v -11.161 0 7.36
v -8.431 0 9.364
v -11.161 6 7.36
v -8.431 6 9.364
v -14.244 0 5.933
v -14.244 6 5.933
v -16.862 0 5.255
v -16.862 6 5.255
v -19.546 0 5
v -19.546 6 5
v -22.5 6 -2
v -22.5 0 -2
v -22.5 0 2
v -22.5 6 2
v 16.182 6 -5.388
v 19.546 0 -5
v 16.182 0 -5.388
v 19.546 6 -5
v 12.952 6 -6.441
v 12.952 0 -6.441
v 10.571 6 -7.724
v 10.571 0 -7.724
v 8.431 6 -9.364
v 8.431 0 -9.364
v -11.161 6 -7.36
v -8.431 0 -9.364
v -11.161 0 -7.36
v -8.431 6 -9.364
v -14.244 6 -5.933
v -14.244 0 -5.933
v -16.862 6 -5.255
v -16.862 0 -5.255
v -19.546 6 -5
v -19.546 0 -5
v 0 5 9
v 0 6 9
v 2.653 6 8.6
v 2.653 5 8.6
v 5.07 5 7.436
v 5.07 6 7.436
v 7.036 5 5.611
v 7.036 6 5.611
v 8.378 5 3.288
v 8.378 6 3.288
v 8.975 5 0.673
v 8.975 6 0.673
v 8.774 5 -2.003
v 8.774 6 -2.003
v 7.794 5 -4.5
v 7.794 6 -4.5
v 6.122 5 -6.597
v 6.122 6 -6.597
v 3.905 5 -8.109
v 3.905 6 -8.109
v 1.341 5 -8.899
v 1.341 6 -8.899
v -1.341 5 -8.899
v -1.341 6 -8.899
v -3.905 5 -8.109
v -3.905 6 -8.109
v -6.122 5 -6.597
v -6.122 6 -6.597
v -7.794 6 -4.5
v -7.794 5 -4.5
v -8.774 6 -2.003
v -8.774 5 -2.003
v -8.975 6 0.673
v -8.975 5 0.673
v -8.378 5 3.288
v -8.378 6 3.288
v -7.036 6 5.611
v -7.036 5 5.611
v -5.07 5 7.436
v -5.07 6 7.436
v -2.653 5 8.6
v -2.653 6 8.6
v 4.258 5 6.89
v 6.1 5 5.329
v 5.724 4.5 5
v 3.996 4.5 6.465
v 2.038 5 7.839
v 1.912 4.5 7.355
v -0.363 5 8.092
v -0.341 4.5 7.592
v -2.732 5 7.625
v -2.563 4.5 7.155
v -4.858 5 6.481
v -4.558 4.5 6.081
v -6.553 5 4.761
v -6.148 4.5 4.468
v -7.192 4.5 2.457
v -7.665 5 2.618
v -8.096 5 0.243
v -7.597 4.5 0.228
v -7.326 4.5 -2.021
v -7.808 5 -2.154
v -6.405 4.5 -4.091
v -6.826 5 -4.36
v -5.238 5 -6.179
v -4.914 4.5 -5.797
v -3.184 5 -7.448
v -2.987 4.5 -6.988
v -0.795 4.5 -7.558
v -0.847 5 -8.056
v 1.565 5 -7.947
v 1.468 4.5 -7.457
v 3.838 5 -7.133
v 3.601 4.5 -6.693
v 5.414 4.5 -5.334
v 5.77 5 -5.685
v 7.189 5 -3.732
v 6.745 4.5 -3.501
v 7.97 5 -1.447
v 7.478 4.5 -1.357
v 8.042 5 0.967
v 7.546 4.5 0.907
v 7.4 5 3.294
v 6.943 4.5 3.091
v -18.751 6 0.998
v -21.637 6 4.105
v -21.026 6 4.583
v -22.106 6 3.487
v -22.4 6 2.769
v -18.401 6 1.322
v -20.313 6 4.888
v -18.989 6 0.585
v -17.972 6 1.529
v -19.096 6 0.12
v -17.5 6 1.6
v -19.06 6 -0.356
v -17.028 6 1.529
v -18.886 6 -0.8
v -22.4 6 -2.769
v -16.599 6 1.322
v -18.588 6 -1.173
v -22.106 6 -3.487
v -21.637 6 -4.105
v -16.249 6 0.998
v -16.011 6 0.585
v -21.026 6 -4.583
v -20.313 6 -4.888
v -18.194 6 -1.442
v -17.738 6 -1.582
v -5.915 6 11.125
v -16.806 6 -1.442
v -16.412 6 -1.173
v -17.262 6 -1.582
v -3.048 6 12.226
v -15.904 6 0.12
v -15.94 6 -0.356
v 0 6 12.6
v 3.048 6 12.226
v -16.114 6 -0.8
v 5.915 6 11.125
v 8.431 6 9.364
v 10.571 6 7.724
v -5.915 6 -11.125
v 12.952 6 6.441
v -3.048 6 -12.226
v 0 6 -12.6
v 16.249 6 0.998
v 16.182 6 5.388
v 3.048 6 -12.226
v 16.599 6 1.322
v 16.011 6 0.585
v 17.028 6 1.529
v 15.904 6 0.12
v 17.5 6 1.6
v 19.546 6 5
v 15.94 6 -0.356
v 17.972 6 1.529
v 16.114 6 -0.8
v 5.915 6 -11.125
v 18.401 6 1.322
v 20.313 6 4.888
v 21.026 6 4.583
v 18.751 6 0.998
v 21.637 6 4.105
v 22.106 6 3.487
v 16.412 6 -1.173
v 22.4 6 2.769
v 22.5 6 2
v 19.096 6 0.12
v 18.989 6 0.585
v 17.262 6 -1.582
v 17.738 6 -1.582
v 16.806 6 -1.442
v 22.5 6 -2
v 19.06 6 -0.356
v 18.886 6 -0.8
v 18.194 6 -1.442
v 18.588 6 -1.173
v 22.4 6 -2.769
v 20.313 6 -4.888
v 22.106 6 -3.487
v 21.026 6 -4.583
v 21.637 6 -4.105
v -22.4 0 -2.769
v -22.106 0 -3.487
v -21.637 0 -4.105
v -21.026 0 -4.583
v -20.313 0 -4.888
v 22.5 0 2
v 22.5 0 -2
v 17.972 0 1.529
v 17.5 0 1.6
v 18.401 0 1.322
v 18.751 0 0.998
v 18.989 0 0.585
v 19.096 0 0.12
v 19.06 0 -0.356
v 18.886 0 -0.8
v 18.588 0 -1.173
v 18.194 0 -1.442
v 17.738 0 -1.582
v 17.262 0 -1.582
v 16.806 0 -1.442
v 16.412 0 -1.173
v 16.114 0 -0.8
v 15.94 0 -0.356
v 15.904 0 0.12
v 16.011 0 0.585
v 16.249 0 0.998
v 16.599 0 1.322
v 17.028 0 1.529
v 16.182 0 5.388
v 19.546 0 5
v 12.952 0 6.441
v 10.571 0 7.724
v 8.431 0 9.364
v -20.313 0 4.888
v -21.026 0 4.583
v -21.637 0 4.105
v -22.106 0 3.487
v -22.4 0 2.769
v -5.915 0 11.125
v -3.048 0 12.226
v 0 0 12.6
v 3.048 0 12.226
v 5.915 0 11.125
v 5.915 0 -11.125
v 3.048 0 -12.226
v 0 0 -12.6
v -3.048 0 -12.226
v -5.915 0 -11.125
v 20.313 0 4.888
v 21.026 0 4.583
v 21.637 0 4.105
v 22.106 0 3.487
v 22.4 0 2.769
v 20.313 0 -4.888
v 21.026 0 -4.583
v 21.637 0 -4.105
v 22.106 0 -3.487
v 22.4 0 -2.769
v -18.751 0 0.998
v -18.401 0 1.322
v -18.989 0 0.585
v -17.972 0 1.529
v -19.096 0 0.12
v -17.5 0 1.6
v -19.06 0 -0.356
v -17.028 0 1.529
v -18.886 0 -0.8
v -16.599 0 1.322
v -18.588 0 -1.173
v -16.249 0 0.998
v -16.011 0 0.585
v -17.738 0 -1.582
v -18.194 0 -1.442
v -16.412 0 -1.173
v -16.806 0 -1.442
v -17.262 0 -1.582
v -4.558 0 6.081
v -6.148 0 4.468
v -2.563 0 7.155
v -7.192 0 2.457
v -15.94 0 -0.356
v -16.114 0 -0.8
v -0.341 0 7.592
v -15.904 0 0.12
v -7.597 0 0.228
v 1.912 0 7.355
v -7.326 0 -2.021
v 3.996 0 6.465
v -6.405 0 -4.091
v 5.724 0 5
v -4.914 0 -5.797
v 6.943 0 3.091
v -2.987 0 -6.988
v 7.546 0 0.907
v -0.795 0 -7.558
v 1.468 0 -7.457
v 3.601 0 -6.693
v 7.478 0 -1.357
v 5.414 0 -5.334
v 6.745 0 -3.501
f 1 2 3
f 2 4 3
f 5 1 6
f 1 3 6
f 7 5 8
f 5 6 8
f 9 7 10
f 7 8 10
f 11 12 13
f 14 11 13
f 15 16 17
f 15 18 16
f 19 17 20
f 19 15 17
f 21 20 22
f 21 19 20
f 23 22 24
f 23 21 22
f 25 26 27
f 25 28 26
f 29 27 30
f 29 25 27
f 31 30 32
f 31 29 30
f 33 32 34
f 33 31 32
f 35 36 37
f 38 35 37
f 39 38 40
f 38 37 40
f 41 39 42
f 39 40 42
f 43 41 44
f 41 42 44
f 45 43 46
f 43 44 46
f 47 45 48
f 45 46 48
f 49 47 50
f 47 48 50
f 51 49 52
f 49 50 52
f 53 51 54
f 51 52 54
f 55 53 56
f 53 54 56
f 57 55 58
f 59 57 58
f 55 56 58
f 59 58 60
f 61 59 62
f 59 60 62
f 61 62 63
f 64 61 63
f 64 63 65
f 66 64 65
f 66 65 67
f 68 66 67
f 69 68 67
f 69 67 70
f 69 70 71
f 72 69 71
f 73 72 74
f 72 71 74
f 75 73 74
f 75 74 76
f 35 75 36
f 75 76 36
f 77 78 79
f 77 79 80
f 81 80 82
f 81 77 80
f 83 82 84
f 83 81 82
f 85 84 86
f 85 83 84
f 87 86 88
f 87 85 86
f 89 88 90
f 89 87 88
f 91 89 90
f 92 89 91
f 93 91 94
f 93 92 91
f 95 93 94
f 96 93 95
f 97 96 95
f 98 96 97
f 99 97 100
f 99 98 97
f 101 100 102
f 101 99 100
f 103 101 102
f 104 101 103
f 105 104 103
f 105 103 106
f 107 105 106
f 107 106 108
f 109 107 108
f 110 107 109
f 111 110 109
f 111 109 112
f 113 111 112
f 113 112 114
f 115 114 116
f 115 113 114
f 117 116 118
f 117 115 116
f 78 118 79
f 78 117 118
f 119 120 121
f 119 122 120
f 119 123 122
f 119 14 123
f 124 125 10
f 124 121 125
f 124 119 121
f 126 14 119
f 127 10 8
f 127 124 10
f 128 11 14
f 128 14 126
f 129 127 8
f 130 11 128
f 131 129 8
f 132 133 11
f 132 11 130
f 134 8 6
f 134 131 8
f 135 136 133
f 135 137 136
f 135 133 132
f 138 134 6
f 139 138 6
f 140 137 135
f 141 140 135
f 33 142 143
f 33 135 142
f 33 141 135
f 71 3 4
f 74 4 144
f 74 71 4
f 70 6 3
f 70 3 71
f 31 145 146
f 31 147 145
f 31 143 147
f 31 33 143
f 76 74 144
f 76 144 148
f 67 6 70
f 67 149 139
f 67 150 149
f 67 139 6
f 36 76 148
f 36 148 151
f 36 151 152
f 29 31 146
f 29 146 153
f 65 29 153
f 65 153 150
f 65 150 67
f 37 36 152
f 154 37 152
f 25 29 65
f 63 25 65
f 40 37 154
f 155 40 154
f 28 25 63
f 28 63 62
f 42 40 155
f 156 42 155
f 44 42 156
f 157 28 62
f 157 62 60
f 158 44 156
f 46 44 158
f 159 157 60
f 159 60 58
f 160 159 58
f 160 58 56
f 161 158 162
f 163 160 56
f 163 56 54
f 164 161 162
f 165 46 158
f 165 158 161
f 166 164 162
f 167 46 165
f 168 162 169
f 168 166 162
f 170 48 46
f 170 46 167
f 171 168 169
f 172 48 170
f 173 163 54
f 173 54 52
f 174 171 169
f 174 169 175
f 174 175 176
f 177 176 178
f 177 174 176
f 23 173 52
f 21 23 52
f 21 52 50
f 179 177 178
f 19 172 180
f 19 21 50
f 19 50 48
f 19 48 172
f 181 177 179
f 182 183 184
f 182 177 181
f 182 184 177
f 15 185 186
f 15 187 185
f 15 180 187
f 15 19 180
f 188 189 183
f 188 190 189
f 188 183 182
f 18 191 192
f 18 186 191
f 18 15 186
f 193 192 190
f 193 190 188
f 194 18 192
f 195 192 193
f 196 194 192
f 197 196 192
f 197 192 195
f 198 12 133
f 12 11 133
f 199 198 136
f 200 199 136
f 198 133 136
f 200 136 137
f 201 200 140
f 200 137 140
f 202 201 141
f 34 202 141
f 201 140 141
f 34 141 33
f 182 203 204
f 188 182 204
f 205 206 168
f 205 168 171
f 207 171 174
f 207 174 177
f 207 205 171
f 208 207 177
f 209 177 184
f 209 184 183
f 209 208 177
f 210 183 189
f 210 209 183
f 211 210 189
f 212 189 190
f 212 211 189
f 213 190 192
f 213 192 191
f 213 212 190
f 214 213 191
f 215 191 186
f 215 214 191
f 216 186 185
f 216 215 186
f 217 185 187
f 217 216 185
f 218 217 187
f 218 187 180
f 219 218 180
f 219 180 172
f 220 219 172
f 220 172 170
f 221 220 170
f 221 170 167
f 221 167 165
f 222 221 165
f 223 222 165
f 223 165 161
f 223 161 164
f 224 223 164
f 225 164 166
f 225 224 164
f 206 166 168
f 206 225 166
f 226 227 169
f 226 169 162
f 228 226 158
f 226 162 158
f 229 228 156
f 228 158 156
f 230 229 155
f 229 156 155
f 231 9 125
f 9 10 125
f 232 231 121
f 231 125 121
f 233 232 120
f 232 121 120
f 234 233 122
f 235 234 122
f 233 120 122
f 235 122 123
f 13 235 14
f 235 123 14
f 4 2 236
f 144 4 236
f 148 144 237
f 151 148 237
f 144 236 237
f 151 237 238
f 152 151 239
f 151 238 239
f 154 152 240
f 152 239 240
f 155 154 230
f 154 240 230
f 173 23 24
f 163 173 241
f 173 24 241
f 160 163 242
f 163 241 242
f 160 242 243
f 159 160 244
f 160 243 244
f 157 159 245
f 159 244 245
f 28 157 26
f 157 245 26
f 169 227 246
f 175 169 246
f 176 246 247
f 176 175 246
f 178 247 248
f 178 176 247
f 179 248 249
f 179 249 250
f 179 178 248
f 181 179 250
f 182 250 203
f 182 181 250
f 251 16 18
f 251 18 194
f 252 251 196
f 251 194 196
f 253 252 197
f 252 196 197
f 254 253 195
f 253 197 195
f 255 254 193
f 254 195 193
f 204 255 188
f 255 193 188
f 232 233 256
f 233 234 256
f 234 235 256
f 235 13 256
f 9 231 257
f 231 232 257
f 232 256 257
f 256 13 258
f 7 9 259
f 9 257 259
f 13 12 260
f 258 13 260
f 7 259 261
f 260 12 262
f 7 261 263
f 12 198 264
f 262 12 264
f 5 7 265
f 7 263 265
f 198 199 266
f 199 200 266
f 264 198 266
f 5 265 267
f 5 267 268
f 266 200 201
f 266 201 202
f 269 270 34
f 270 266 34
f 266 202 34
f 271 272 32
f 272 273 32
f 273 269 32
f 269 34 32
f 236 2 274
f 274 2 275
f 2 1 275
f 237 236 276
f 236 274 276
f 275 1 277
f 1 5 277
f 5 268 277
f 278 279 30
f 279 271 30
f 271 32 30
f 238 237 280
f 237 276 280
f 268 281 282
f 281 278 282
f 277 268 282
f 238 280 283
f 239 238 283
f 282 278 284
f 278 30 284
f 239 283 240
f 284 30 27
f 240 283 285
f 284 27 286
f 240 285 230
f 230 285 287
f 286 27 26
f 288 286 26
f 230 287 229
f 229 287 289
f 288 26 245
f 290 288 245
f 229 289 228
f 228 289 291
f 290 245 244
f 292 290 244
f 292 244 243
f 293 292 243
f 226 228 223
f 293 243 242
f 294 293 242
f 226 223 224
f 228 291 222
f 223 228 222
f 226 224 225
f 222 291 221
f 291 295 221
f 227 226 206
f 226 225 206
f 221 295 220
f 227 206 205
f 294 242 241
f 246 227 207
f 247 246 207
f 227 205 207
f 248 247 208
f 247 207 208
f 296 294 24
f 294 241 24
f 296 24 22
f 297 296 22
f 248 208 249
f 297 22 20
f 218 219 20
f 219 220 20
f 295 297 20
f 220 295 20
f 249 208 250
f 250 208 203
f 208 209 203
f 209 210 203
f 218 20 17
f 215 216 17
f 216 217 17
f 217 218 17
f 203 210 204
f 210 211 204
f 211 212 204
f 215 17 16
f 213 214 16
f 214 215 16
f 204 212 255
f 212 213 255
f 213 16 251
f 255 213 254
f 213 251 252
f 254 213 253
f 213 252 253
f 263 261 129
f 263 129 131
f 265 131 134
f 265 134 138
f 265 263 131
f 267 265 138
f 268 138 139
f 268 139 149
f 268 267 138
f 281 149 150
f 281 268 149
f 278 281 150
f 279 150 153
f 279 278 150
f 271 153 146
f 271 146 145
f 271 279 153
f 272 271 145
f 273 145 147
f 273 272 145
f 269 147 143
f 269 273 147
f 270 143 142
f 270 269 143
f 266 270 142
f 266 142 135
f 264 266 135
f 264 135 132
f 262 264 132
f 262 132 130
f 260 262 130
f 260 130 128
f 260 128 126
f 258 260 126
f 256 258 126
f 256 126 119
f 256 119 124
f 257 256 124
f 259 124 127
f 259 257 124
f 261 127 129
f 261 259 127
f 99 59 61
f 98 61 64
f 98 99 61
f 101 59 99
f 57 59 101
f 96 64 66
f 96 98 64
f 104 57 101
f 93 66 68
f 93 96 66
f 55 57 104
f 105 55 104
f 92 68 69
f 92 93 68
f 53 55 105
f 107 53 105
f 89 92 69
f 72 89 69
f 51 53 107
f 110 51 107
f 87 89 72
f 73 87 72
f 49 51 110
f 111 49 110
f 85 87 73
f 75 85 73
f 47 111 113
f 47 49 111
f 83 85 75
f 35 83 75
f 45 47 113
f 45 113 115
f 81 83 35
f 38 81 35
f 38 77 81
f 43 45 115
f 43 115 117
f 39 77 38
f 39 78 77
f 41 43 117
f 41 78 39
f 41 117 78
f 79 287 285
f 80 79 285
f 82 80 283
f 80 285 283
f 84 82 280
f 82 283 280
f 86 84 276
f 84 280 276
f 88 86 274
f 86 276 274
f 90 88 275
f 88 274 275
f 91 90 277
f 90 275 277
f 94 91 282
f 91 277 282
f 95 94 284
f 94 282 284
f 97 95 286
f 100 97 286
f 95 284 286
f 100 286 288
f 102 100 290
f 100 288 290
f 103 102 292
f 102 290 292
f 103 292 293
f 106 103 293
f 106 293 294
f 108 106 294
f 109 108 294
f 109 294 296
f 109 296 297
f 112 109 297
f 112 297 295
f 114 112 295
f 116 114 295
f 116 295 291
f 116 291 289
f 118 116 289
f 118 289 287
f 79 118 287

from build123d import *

# Parameters (mm, degrees)
SKETCH1_R           = 1.6000000000000016
BOSS_EXTRUDE1_DEPTH = 6
FILLET1_R           = 3
FILLET2_R           = 17
SKETCH2_R           = 9
CUT_EXTRUDE1_DEPTH  = 1
CHAMFER1_SIZE       = 0.5


with BuildPart() as part:
    # Sketch1 → Boss-Extrude1 (new body)
    # profile 1 of 8: a face of its own
    with BuildSketch(Plane(origin=(0, 0, 0), x_dir=(1, 0, 0), z_dir=(0, 1, 0))):
        with BuildLine():
            Line((-5.7236352085013955, -4.999999999999999), (-11.56546583584068, -5))
            ThreePointArc((-11.565465835840719, -5.000000000000114), (6.483e-14, -12.6), (11.565465835840772, -4.99999999999999))
            Line((11.565465835840783, -4.999999999999998), (5.7236352085012925, -4.999999999999999))
            ThreePointArc((5.723635208501399, -5.000000000000313), (-5.54e-14, -7.599999999999999), (-5.723635208501475, -5.0000000000002265))
        make_face()
    # profile 2 of 8: a face of its own
    with BuildSketch(Plane(origin=(0, 0, 0), x_dir=(1, 0, 0), z_dir=(0, 1, 0))):
        with BuildLine():
            Line((-11.56546583584068, 5), (-22.5, 5))
            Line((-22.5, 5), (-22.5, -5))
            Line((-22.5, -5), (-11.56546583584068, -5))
            ThreePointArc((-11.565465835840719, -5.000000000000114), (-12.6, 1.54e-15), (-11.565465835840715, 5.000000000000122))
        make_face()
        with Locations(Location((-17.499999999999996, 0, 0), (0, 0, 270))):
            Circle(SKETCH1_R, mode=Mode.SUBTRACT)
    # profile 3 of 8: a face of its own
    with BuildSketch(Plane(origin=(0, 0, 0), x_dir=(1, 0, 0), z_dir=(0, 1, 0))):
        with BuildLine():
            Line((-5.7236352085013955, 4.999999999999999), (-11.56546583584068, 5))
            ThreePointArc((-11.565465835840715, 5.000000000000122), (-12.6, 1.54e-15), (-11.565465835840719, -5.000000000000114))
            Line((-11.56546583584068, -5), (-5.7236352085013955, -4.999999999999999))
            ThreePointArc((-5.723635208501475, -5.0000000000002265), (-7.599999999999999, 9.3e-16), (-5.723635208501473, 5.000000000000228))
        make_face()
    # profile 4 of 8: a face of its own
    with BuildSketch(Plane(origin=(0, 0, 0), x_dir=(1, 0, 0), z_dir=(0, 1, 0))):
        with BuildLine():
            ThreePointArc((12.6, 0), (12.338656116684541, 2.5529522585044844), (11.56546583584077, 4.999999999999995))
            Line((11.565465835840769, 4.999999999999998), (5.723635208502053, 4.999999999999999))
            ThreePointArc((5.723635208501946, 4.9999999999996865), (7.115463006179385, 2.670240852000546), (7.599999999999999, 0))
            ThreePointArc((7.599999999999999, -1.86e-15), (7.11546300617924, -2.6702408520009326), (5.723635208501399, -5.000000000000313))
            Line((5.7236352085012925, -4.999999999999999), (11.565465835840783, -4.999999999999998))
            ThreePointArc((11.565465835840772, -4.99999999999999), (12.338656116684541, -2.552952258504483), (12.6, -3.09e-15))
        make_face()
    # profile 5 of 8: a face of its own
    with BuildSketch(Plane(origin=(0, 0, 0), x_dir=(1, 0, 0), z_dir=(0, 1, 0))):
        with BuildLine():
            ThreePointArc((11.56546583584077, 4.999999999999995), (7.072e-14, 12.6), (-11.565465835840715, 5.000000000000122))
            Line((-11.56546583584068, 5), (-5.7236352085013955, 4.999999999999999))
            ThreePointArc((-5.723635208501473, 5.000000000000228), (3.5822e-13, 7.599999999999999), (5.723635208501945, 4.999999999999687))
            Line((5.723635208502053, 4.999999999999999), (11.565465835840769, 4.999999999999998))
        make_face()
    # profile 6 of 8: a face of its own
    with BuildSketch(Plane(origin=(0, 0, 0), x_dir=(1, 0, 0), z_dir=(0, 1, 0))):
        with BuildLine():
            Line((-5.7236352085013955, 4.999999999999999), (-11.56546583584068, 5))
            ThreePointArc((-11.565465835840715, 5.000000000000122), (-12.6, 1.54e-15), (-11.565465835840719, -5.000000000000114))
            Line((-11.56546583584068, -5), (-5.7236352085013955, -4.999999999999999))
            ThreePointArc((-5.723635208501475, -5.0000000000002265), (-7.599999999999999, 9.3e-16), (-5.723635208501473, 5.000000000000228))
        make_face()
    # profile 7 of 8: a face of its own
    with BuildSketch(Plane(origin=(0, 0, 0), x_dir=(1, 0, 0), z_dir=(0, 1, 0))):
        with BuildLine():
            ThreePointArc((12.6, 0), (12.338656116684541, 2.5529522585044844), (11.56546583584077, 4.999999999999995))
            Line((11.565465835840769, 4.999999999999998), (5.723635208502053, 4.999999999999999))
            ThreePointArc((5.723635208501946, 4.9999999999996865), (7.115463006179385, 2.670240852000546), (7.599999999999999, 0))
            ThreePointArc((7.599999999999999, -1.86e-15), (7.11546300617924, -2.6702408520009326), (5.723635208501399, -5.000000000000313))
            Line((5.7236352085012925, -4.999999999999999), (11.565465835840783, -4.999999999999998))
            ThreePointArc((11.565465835840772, -4.99999999999999), (12.338656116684541, -2.552952258504483), (12.6, -3.09e-15))
        make_face()
    # profile 8 of 8: a face of its own
    with BuildSketch(Plane(origin=(0, 0, 0), x_dir=(1, 0, 0), z_dir=(0, 1, 0))):
        with BuildLine():
            Line((22.5, 4.999999999999998), (11.565465835840769, 4.999999999999998))
            ThreePointArc((11.56546583584077, 4.999999999999995), (12.338656116684541, 2.5529522585044844), (12.6, 0))
            ThreePointArc((12.6, -3.09e-15), (12.338656116684541, -2.552952258504483), (11.565465835840772, -4.99999999999999))
            Line((11.565465835840783, -4.999999999999998), (22.5, -4.999999999999998))
            Line((22.5, -4.999999999999998), (22.5, 4.999999999999998))
        make_face()
        with Locations(Location((17.499999999999996, 0, 0), (0, 0, 270))):
            Circle(SKETCH1_R, mode=Mode.SUBTRACT)
    extrude(amount=BOSS_EXTRUDE1_DEPTH)

    # Fillet1
    fillet1_edges = [part.edges().sort_by_distance(p)[0] for p in [
        (22.5, 3, -4.999999999999998),
        (22.5, 3, 4.999999999999998),
        (-22.5, 3, 5),
        (-22.5, 3, -5),
    ]]
    fillet(fillet1_edges, radius=FILLET1_R)

    # Fillet2
    fillet2_edges = [part.edges().sort_by_distance(p)[0] for p in [
        (11.56546583584077, 3, -4.9999999999999964),
        (-11.5654658358407, 3, -5.00000000000006),
        (11.565465835840776, 3, 4.999999999999994),
        (-11.5654658358407, 3, 5.000000000000057),
    ]]
    fillet(fillet2_edges, radius=FILLET2_R)

    # Sketch2 → Cut-Extrude1 (cut)
    with BuildSketch(Plane(origin=(0, 6, 0), x_dir=(1, 0, 0), z_dir=(0, 1, 0))):
        with Locations(Location((0, 0, 0), (0, 0, 270))):
            Circle(SKETCH2_R)
    extrude(amount=-CUT_EXTRUDE1_DEPTH, mode=Mode.SUBTRACT)

    # Chamfer1
    chamfer1_edges = [part.edges().sort_by_distance(p)[0] for p in [
        (-5.7236352085019595, 5, 4.999999999999671),
    ]]
    chamfer(chamfer1_edges, length=CHAMFER1_SIZE)


solid = part.part
